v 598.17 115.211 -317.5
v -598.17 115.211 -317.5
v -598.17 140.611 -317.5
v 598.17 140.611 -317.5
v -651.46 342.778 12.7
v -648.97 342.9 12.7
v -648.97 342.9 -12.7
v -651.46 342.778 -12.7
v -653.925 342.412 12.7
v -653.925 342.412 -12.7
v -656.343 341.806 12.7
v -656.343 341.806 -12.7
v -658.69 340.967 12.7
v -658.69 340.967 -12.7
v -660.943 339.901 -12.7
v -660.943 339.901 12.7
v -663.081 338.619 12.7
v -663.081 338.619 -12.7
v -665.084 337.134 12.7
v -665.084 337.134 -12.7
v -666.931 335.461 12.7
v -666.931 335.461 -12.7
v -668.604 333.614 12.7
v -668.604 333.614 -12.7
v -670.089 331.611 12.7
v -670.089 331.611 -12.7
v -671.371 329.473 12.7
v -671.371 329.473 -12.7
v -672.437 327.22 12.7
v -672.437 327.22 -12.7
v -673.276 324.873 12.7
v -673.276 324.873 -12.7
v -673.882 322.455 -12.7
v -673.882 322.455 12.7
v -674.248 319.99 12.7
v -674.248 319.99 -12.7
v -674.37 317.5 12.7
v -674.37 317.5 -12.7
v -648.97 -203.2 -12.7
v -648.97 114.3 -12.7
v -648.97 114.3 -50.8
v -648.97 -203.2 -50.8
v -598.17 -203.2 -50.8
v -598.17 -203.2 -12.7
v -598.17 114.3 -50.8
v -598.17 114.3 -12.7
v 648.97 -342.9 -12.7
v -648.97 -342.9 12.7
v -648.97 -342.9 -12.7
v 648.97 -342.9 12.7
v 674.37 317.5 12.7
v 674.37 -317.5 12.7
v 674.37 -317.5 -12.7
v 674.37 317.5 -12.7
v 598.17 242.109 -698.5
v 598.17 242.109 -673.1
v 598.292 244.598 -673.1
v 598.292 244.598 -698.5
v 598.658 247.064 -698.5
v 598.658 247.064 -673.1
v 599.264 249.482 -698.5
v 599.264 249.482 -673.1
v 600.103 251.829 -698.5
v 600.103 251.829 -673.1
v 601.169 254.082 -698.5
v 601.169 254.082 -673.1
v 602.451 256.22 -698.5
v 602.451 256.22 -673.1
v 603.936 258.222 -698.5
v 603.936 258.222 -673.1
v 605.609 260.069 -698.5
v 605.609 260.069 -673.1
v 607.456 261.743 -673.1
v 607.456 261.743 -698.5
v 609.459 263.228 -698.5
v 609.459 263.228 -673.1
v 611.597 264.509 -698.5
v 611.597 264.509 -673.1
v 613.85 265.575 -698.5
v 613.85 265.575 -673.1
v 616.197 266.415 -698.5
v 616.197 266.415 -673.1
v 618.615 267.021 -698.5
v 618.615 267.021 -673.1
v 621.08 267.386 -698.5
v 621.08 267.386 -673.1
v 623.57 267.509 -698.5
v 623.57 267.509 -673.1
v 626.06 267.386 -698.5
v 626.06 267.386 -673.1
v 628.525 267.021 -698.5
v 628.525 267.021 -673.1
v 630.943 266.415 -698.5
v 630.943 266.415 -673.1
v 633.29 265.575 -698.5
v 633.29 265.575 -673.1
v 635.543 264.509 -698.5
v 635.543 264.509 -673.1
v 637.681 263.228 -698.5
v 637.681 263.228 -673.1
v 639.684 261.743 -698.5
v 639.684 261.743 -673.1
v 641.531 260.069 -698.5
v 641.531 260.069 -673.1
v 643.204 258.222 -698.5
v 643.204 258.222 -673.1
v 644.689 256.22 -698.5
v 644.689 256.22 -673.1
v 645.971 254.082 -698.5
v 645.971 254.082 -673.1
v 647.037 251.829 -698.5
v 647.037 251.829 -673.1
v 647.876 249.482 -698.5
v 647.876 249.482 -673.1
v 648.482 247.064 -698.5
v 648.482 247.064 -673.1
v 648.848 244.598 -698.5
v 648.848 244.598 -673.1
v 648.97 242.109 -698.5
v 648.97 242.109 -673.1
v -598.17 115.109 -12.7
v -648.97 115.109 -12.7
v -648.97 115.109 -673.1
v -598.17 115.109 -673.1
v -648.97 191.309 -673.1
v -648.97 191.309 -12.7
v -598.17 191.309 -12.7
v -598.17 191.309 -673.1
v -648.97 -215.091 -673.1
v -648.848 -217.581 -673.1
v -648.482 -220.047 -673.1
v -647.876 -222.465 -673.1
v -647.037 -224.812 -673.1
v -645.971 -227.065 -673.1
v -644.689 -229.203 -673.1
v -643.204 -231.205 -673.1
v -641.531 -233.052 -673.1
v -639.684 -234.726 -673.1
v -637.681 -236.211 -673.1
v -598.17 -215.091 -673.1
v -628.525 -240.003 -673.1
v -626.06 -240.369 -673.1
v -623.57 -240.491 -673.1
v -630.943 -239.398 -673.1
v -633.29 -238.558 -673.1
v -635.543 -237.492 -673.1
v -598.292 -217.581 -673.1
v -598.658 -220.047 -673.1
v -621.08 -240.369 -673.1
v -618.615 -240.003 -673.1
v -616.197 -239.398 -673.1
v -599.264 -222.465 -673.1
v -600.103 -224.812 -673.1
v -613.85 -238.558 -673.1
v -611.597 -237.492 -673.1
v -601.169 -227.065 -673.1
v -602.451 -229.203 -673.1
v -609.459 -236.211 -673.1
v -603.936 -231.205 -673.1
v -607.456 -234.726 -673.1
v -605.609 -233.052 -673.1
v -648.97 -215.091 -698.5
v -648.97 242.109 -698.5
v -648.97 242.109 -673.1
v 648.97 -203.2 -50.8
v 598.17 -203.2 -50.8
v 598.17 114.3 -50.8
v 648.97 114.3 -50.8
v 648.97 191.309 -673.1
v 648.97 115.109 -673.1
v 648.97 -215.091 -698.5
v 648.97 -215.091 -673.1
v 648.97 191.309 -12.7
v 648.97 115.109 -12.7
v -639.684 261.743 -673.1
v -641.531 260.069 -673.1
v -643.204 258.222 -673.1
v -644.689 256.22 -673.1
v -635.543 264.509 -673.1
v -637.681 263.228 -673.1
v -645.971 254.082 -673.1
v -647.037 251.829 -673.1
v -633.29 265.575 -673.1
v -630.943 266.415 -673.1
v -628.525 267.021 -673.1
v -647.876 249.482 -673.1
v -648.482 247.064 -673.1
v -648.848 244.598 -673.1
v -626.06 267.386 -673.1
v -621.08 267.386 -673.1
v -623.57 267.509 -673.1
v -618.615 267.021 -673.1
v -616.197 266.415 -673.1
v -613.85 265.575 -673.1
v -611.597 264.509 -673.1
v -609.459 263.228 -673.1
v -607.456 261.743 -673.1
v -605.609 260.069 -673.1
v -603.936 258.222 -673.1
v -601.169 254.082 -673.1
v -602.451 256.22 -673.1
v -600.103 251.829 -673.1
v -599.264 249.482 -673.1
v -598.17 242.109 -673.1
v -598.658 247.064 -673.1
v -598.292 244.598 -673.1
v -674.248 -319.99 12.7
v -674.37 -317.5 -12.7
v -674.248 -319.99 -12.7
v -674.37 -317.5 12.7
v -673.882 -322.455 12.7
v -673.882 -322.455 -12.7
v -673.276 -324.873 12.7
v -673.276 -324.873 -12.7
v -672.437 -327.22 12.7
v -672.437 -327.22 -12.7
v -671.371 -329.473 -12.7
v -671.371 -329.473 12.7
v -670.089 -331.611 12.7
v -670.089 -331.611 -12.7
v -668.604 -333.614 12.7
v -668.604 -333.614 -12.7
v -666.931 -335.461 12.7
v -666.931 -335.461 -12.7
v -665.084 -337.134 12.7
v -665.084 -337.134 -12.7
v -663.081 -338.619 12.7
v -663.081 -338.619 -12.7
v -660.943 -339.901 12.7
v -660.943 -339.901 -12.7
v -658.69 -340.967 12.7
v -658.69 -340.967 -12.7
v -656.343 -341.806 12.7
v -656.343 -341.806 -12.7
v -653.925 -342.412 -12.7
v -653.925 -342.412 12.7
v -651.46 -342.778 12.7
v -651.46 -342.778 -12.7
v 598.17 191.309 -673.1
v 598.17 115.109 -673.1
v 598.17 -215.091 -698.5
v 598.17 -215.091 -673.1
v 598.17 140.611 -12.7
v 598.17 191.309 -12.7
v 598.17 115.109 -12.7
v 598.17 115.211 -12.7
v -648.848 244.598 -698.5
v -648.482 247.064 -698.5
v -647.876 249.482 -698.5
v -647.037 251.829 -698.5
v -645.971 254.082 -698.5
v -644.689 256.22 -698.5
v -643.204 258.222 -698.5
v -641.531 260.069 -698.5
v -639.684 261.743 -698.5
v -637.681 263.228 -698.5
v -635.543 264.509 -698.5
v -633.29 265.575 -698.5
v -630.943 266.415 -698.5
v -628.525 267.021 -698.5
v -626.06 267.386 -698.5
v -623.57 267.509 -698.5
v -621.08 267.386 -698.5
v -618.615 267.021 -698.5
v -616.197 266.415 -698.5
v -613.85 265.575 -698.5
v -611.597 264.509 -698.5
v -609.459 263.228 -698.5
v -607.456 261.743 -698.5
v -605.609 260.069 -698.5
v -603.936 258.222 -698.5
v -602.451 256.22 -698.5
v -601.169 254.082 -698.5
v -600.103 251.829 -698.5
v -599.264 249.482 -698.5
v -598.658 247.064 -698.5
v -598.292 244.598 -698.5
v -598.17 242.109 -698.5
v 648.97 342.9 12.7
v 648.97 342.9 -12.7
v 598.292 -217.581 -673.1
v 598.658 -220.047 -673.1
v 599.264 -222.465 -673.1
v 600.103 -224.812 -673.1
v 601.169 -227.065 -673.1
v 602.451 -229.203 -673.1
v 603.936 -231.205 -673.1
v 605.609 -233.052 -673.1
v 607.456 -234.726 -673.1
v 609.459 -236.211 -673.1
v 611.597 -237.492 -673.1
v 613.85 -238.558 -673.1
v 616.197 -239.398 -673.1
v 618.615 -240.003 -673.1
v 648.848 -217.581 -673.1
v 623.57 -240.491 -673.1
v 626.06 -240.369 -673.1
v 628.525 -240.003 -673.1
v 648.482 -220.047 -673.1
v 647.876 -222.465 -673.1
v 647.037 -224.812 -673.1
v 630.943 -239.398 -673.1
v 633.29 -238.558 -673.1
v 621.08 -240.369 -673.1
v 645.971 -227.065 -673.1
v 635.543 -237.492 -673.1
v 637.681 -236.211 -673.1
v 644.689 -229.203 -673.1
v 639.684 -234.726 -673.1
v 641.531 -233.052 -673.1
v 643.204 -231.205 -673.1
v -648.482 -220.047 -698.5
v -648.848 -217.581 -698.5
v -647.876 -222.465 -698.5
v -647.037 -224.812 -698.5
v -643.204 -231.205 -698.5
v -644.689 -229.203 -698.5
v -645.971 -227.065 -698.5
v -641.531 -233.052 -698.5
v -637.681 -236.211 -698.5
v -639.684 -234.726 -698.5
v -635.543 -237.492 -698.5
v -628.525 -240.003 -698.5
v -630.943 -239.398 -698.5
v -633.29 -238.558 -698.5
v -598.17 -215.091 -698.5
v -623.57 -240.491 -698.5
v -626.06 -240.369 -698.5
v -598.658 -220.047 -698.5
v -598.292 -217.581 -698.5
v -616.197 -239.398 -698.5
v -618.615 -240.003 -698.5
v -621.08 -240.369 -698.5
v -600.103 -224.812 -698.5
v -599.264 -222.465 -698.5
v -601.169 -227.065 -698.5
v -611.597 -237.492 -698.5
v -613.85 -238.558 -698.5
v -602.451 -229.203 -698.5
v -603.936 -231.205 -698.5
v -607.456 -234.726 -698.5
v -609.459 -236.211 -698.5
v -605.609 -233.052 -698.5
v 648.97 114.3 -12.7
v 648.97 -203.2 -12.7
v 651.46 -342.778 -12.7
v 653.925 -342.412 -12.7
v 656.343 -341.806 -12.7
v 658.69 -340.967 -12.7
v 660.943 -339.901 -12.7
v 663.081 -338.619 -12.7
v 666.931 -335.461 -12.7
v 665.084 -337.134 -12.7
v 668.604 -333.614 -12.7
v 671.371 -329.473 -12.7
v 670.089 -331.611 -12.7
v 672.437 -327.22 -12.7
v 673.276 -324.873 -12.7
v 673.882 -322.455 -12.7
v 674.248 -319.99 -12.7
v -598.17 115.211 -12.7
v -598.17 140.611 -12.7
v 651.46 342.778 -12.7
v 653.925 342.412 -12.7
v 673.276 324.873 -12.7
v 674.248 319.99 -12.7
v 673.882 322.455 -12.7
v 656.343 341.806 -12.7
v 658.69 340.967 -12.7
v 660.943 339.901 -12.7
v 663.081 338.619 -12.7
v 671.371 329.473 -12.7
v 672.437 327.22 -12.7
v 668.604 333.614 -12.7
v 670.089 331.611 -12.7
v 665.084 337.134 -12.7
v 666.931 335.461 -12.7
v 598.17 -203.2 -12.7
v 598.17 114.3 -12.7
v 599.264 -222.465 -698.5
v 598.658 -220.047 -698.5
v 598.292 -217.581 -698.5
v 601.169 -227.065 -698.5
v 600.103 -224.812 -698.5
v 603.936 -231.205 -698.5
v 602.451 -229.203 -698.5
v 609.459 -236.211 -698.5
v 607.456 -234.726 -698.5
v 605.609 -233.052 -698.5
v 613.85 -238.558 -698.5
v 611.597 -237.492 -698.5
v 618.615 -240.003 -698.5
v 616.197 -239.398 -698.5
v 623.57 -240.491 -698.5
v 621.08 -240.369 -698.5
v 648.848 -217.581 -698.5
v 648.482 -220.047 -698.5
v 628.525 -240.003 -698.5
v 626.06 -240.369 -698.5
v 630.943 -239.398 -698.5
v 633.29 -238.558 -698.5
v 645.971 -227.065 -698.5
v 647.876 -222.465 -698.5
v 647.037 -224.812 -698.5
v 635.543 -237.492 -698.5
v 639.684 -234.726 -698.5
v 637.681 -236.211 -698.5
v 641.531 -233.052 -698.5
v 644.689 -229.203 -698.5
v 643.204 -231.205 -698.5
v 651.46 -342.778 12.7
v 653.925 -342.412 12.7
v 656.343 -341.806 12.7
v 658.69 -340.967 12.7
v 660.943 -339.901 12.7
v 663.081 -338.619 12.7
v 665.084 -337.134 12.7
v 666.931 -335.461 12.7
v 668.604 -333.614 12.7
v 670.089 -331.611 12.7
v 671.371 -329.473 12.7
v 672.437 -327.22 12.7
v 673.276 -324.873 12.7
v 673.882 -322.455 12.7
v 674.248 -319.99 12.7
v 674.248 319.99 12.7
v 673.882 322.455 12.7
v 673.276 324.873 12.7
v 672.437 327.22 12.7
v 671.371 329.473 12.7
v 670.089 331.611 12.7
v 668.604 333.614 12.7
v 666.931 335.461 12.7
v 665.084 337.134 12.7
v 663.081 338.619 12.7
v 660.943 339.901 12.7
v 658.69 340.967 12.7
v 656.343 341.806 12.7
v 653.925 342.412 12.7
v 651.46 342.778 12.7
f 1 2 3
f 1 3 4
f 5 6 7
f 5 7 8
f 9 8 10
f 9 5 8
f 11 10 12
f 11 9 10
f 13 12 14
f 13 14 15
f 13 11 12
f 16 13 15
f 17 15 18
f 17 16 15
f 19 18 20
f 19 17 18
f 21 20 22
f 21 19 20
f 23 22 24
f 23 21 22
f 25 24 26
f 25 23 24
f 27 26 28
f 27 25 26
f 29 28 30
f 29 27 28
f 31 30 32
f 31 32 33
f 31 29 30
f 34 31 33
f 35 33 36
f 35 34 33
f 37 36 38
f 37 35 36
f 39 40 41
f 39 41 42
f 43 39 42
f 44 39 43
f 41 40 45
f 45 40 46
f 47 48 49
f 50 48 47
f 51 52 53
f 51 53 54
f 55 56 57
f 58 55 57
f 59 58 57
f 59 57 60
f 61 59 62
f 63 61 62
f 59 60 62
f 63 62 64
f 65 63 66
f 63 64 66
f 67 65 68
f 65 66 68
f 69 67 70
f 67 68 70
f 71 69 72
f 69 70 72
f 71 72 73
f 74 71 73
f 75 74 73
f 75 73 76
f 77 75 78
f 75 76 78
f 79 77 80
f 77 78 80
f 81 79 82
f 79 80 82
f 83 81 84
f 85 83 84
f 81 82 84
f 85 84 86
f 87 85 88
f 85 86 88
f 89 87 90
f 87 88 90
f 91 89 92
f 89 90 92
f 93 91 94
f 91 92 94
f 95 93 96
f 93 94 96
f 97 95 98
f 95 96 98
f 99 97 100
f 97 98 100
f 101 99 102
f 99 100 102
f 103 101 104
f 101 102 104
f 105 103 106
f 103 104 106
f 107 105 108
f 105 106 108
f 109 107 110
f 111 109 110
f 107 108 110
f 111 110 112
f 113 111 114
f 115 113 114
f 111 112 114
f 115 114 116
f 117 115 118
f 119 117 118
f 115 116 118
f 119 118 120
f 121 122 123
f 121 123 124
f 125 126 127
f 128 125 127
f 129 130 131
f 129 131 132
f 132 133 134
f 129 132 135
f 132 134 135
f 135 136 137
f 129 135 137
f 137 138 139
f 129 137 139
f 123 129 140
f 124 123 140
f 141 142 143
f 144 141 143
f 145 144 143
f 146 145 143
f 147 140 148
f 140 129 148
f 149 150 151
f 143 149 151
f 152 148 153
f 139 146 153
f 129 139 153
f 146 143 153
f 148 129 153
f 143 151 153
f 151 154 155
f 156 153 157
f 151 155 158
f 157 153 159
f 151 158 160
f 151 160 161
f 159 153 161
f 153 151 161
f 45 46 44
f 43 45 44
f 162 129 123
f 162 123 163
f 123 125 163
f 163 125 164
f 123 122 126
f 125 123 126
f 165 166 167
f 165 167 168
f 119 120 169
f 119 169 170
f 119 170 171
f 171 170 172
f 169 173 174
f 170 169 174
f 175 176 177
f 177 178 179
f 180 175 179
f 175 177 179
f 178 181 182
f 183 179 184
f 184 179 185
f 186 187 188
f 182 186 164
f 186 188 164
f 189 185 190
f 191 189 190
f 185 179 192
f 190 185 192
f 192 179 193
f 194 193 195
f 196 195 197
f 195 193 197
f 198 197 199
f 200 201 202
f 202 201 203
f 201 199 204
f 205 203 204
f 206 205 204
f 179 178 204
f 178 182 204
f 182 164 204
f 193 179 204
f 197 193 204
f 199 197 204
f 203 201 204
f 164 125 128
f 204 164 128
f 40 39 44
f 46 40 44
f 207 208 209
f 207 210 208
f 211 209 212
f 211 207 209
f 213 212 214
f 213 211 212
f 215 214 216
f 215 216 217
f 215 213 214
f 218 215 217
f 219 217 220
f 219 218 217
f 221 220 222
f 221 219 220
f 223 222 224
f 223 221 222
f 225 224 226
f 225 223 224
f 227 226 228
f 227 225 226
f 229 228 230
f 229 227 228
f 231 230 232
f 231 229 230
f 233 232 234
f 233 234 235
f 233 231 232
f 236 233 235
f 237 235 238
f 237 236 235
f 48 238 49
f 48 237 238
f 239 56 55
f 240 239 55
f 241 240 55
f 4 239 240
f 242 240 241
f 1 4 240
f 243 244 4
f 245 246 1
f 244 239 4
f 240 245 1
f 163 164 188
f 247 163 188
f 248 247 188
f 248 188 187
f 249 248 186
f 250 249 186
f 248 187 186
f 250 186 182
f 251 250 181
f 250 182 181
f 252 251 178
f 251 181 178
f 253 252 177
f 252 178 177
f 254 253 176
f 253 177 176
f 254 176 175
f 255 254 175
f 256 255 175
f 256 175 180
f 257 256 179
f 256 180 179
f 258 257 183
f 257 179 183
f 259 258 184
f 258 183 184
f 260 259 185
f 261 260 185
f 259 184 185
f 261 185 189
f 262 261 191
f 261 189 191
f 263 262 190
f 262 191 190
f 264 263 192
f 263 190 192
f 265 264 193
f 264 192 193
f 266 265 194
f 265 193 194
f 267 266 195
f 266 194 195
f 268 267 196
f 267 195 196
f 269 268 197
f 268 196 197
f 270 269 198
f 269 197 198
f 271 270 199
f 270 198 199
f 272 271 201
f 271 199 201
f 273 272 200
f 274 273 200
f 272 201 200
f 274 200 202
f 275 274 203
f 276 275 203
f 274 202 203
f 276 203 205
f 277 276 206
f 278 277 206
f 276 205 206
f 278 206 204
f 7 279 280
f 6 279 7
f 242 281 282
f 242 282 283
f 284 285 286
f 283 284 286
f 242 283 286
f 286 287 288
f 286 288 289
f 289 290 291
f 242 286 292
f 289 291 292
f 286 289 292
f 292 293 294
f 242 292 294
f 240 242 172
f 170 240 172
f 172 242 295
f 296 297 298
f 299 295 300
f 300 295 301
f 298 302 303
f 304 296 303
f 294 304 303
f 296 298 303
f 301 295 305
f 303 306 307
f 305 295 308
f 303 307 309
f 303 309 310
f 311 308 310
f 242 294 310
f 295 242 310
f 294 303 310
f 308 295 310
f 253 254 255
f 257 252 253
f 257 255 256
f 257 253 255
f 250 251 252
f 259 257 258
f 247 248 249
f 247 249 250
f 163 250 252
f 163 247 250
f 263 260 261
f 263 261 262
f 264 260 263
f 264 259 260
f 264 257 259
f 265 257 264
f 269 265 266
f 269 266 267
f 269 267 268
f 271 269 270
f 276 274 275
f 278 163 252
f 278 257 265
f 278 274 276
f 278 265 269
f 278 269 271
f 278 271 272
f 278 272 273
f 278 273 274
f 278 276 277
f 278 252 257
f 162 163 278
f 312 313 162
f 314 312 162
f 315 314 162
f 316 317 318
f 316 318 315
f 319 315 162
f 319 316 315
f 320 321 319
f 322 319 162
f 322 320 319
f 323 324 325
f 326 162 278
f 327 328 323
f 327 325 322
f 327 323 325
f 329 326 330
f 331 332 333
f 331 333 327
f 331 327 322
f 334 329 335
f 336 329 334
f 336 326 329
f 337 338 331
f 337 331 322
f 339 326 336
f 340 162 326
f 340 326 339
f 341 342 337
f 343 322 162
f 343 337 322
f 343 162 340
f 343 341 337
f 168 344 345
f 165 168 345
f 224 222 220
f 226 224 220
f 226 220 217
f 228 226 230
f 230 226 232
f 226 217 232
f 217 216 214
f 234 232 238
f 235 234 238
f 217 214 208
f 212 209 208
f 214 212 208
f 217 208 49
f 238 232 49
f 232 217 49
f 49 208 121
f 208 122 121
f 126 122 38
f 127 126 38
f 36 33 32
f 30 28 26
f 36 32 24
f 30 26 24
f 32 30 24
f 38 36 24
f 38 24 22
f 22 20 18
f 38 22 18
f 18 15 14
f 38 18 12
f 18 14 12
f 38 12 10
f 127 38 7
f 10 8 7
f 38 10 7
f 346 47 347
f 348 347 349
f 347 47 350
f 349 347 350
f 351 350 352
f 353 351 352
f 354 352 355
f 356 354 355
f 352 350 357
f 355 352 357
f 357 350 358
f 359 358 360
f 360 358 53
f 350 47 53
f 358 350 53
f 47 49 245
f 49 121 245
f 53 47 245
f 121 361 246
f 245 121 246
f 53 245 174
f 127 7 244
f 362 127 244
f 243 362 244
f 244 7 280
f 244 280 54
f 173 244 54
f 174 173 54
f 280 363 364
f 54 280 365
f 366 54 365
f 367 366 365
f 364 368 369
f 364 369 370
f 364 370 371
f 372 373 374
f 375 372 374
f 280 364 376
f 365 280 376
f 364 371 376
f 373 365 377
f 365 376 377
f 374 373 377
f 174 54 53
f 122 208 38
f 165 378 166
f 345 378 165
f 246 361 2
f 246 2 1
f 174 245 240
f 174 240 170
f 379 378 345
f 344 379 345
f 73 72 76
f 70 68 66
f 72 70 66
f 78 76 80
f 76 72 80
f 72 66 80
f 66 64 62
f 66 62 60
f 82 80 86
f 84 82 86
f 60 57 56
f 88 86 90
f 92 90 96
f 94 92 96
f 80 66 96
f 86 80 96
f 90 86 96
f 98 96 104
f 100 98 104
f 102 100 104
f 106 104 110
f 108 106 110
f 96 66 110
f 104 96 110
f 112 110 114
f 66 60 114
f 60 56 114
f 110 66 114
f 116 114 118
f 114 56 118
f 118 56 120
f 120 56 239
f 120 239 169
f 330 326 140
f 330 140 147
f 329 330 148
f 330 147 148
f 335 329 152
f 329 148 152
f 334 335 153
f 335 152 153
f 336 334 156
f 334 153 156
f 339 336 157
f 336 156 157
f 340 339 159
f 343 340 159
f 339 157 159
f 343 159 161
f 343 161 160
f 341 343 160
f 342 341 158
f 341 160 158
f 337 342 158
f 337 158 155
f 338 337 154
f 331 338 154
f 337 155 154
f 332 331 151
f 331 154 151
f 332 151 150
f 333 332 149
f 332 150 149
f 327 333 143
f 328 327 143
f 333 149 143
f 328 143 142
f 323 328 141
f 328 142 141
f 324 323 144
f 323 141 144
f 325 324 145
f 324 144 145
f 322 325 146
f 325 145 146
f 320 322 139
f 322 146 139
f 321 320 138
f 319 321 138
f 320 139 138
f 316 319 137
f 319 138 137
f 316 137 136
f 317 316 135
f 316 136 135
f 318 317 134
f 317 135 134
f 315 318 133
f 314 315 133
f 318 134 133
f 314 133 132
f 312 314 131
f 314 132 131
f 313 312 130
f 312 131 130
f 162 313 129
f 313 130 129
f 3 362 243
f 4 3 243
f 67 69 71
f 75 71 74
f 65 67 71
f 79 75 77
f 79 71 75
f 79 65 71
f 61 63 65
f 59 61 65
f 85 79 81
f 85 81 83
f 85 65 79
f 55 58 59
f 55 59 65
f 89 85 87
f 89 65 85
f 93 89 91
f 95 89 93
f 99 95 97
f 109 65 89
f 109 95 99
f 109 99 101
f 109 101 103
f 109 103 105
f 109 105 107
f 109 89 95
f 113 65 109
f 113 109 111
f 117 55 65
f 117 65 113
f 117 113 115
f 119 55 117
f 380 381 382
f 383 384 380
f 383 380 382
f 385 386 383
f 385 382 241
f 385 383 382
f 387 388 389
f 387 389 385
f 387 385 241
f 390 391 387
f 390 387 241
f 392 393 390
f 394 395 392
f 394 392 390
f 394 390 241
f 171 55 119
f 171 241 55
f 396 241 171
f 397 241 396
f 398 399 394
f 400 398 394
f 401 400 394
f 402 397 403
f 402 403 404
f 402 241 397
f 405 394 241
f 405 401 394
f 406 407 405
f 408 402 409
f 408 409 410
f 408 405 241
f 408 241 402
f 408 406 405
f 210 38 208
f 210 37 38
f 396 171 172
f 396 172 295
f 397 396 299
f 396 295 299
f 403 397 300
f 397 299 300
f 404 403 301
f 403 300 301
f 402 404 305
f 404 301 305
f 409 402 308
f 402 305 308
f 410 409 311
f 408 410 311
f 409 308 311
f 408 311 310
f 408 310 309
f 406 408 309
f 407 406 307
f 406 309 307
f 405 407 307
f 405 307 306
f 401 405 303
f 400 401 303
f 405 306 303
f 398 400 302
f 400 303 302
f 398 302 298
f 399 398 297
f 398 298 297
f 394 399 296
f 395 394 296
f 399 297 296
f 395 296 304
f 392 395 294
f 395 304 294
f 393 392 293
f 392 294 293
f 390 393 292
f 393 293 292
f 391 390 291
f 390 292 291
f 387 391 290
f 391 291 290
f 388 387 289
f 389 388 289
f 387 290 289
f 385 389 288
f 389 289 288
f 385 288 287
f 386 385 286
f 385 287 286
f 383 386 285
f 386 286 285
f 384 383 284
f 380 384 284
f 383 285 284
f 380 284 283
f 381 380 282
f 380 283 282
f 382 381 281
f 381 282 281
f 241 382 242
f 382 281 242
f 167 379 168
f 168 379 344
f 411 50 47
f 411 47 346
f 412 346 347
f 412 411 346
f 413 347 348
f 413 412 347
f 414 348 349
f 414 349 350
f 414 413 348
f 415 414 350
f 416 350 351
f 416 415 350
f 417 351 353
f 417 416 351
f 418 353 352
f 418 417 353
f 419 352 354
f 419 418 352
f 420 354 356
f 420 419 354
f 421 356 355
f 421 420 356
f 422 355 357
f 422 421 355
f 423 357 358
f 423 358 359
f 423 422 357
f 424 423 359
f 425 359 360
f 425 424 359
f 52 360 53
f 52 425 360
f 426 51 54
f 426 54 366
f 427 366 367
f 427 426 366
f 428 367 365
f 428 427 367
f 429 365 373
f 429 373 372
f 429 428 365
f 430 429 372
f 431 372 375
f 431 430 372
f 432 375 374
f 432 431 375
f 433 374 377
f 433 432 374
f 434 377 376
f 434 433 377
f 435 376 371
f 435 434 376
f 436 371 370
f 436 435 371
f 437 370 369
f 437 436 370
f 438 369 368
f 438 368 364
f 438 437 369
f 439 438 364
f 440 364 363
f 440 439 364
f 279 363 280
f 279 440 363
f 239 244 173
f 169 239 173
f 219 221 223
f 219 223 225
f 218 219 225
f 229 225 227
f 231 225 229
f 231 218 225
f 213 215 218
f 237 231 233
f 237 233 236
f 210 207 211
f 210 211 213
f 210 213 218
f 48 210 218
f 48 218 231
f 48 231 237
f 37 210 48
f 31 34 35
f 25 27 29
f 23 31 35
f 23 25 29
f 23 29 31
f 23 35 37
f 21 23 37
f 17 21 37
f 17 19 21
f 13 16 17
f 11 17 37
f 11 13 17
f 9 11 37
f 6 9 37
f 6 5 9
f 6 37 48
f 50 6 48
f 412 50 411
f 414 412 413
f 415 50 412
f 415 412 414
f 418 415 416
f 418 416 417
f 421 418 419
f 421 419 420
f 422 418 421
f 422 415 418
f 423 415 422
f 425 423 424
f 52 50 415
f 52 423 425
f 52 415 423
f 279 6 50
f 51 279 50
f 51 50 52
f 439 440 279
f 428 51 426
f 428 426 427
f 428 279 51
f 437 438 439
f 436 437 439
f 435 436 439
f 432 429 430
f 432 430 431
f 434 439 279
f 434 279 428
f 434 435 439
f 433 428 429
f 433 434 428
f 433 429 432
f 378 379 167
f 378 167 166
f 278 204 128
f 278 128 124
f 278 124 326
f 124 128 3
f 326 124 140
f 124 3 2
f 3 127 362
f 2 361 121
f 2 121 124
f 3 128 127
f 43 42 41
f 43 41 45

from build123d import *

# Parameters (mm, degrees)
F1_DEPTH  = 12.7
F3_W      = 50.8
F3_H      = 317.5
F4_DEPTH  = 38.1
F5_W      = 50.8
F5_H      = 76.2
F6_DEPTH  = 660.4
F7_W      = 50.8
F7_H      = 406.4
F7_H_2    = 50.8
F8_DEPTH  = 25.4
F9_W      = 1295.4
F9_H      = 25.4
F10_DEPTH = 304.8


with BuildPart() as f1:
    # F0 (on Top) → F1 (new body, symmetric)
    with BuildSketch(Plane.XY):
        with BuildLine():
            Line((-648.97, -342.9), (648.97, -342.9))
            ThreePointArc((648.97, -342.9), (666.930512, -335.460512), (674.37, -317.5))
            Line((674.37, -317.5), (674.37, 317.5))
            ThreePointArc((674.37, 317.5), (666.930512, 335.460512), (648.97, 342.9))
            Line((648.97, 342.9), (-648.97, 342.9))
            ThreePointArc((-648.97, 342.9), (-666.930512, 335.460512), (-674.37, 317.5))
            Line((-674.37, 317.5), (-674.37, -317.5))
            ThreePointArc((-674.37, -317.5), (-666.930512, -335.460512), (-648.97, -342.9))
        make_face()
    extrude(amount=F1_DEPTH, both=True)

    # F5 (on face) → F6 (join)
    with BuildSketch(Plane(origin=(0, 0, -12.7), x_dir=(1, 0, 0), z_dir=(0, 0, -1))):
        with Locations((-623.57, -153.208654)):
            Rectangle(F5_W, F5_H)
        with Locations((623.57, -153.208654)):
            Rectangle(F5_W, F5_H)
    extrude(amount=F6_DEPTH)

    # F7 (on face) → F8 (join)
    with BuildSketch(Plane(origin=(0, 0, -673.1), x_dir=(1, 0, 0), z_dir=(0, 0, -1))):
        with Locations((-623.57, 11.891346)):
            Rectangle(F7_W, F7_H)
        with Locations((-623.57, -216.708654)):
            Rectangle(F7_W, F7_H_2)
        with BuildLine():
            Line((-598.17, -242.108654), (-648.97, -242.108654))
            ThreePointArc((-648.97, -242.108654), (-623.57, -267.508654), (-598.17, -242.108654))
        make_face()
        with BuildLine():
            ThreePointArc((-598.17, 215.091346), (-623.57, 240.491346), (-648.97, 215.091346))
            Line((-648.97, 215.091346), (-598.17, 215.091346))
        make_face()
        with BuildLine():
            Line((598.17, 215.091346), (648.97, 215.091346))
            ThreePointArc((648.97, 215.091346), (623.57, 240.491346), (598.17, 215.091346))
        make_face()
        Polygon((648.97, -191.308654), (648.97, 215.091346), (598.17, 215.091346), (598.17, -191.308654), (598.17, -242.108654), (648.97, -242.108654), align=None)
        with BuildLine():
            ThreePointArc((598.17, -242.108654), (623.57, -267.508654), (648.97, -242.108654))
            Line((648.97, -242.108654), (598.17, -242.108654))
        make_face()
    extrude(amount=F8_DEPTH)

    # F9 (on face) → F10 (join)
    with BuildSketch(Plane(origin=(0, 0, -12.7), x_dir=(1, 0, 0), z_dir=(0, 0, -1))):
        with Locations((-0.760269, -127.911308)):
            Rectangle(F9_W, F9_H)
    extrude(amount=F10_DEPTH)


with BuildPart() as f4:
    # F3 (on face) → F4 (new body)
    with BuildSketch(Plane(origin=(0, 0, -12.7), x_dir=(1, 0, 0), z_dir=(0, 0, -1))):
        with Locations((-623.57, 44.45)):
            Rectangle(F3_W, F3_H)
        with Locations((623.57, 44.45)):
            Rectangle(F3_W, F3_H)
    extrude(amount=F4_DEPTH)


solid = Compound([f1.part, f4.part])
